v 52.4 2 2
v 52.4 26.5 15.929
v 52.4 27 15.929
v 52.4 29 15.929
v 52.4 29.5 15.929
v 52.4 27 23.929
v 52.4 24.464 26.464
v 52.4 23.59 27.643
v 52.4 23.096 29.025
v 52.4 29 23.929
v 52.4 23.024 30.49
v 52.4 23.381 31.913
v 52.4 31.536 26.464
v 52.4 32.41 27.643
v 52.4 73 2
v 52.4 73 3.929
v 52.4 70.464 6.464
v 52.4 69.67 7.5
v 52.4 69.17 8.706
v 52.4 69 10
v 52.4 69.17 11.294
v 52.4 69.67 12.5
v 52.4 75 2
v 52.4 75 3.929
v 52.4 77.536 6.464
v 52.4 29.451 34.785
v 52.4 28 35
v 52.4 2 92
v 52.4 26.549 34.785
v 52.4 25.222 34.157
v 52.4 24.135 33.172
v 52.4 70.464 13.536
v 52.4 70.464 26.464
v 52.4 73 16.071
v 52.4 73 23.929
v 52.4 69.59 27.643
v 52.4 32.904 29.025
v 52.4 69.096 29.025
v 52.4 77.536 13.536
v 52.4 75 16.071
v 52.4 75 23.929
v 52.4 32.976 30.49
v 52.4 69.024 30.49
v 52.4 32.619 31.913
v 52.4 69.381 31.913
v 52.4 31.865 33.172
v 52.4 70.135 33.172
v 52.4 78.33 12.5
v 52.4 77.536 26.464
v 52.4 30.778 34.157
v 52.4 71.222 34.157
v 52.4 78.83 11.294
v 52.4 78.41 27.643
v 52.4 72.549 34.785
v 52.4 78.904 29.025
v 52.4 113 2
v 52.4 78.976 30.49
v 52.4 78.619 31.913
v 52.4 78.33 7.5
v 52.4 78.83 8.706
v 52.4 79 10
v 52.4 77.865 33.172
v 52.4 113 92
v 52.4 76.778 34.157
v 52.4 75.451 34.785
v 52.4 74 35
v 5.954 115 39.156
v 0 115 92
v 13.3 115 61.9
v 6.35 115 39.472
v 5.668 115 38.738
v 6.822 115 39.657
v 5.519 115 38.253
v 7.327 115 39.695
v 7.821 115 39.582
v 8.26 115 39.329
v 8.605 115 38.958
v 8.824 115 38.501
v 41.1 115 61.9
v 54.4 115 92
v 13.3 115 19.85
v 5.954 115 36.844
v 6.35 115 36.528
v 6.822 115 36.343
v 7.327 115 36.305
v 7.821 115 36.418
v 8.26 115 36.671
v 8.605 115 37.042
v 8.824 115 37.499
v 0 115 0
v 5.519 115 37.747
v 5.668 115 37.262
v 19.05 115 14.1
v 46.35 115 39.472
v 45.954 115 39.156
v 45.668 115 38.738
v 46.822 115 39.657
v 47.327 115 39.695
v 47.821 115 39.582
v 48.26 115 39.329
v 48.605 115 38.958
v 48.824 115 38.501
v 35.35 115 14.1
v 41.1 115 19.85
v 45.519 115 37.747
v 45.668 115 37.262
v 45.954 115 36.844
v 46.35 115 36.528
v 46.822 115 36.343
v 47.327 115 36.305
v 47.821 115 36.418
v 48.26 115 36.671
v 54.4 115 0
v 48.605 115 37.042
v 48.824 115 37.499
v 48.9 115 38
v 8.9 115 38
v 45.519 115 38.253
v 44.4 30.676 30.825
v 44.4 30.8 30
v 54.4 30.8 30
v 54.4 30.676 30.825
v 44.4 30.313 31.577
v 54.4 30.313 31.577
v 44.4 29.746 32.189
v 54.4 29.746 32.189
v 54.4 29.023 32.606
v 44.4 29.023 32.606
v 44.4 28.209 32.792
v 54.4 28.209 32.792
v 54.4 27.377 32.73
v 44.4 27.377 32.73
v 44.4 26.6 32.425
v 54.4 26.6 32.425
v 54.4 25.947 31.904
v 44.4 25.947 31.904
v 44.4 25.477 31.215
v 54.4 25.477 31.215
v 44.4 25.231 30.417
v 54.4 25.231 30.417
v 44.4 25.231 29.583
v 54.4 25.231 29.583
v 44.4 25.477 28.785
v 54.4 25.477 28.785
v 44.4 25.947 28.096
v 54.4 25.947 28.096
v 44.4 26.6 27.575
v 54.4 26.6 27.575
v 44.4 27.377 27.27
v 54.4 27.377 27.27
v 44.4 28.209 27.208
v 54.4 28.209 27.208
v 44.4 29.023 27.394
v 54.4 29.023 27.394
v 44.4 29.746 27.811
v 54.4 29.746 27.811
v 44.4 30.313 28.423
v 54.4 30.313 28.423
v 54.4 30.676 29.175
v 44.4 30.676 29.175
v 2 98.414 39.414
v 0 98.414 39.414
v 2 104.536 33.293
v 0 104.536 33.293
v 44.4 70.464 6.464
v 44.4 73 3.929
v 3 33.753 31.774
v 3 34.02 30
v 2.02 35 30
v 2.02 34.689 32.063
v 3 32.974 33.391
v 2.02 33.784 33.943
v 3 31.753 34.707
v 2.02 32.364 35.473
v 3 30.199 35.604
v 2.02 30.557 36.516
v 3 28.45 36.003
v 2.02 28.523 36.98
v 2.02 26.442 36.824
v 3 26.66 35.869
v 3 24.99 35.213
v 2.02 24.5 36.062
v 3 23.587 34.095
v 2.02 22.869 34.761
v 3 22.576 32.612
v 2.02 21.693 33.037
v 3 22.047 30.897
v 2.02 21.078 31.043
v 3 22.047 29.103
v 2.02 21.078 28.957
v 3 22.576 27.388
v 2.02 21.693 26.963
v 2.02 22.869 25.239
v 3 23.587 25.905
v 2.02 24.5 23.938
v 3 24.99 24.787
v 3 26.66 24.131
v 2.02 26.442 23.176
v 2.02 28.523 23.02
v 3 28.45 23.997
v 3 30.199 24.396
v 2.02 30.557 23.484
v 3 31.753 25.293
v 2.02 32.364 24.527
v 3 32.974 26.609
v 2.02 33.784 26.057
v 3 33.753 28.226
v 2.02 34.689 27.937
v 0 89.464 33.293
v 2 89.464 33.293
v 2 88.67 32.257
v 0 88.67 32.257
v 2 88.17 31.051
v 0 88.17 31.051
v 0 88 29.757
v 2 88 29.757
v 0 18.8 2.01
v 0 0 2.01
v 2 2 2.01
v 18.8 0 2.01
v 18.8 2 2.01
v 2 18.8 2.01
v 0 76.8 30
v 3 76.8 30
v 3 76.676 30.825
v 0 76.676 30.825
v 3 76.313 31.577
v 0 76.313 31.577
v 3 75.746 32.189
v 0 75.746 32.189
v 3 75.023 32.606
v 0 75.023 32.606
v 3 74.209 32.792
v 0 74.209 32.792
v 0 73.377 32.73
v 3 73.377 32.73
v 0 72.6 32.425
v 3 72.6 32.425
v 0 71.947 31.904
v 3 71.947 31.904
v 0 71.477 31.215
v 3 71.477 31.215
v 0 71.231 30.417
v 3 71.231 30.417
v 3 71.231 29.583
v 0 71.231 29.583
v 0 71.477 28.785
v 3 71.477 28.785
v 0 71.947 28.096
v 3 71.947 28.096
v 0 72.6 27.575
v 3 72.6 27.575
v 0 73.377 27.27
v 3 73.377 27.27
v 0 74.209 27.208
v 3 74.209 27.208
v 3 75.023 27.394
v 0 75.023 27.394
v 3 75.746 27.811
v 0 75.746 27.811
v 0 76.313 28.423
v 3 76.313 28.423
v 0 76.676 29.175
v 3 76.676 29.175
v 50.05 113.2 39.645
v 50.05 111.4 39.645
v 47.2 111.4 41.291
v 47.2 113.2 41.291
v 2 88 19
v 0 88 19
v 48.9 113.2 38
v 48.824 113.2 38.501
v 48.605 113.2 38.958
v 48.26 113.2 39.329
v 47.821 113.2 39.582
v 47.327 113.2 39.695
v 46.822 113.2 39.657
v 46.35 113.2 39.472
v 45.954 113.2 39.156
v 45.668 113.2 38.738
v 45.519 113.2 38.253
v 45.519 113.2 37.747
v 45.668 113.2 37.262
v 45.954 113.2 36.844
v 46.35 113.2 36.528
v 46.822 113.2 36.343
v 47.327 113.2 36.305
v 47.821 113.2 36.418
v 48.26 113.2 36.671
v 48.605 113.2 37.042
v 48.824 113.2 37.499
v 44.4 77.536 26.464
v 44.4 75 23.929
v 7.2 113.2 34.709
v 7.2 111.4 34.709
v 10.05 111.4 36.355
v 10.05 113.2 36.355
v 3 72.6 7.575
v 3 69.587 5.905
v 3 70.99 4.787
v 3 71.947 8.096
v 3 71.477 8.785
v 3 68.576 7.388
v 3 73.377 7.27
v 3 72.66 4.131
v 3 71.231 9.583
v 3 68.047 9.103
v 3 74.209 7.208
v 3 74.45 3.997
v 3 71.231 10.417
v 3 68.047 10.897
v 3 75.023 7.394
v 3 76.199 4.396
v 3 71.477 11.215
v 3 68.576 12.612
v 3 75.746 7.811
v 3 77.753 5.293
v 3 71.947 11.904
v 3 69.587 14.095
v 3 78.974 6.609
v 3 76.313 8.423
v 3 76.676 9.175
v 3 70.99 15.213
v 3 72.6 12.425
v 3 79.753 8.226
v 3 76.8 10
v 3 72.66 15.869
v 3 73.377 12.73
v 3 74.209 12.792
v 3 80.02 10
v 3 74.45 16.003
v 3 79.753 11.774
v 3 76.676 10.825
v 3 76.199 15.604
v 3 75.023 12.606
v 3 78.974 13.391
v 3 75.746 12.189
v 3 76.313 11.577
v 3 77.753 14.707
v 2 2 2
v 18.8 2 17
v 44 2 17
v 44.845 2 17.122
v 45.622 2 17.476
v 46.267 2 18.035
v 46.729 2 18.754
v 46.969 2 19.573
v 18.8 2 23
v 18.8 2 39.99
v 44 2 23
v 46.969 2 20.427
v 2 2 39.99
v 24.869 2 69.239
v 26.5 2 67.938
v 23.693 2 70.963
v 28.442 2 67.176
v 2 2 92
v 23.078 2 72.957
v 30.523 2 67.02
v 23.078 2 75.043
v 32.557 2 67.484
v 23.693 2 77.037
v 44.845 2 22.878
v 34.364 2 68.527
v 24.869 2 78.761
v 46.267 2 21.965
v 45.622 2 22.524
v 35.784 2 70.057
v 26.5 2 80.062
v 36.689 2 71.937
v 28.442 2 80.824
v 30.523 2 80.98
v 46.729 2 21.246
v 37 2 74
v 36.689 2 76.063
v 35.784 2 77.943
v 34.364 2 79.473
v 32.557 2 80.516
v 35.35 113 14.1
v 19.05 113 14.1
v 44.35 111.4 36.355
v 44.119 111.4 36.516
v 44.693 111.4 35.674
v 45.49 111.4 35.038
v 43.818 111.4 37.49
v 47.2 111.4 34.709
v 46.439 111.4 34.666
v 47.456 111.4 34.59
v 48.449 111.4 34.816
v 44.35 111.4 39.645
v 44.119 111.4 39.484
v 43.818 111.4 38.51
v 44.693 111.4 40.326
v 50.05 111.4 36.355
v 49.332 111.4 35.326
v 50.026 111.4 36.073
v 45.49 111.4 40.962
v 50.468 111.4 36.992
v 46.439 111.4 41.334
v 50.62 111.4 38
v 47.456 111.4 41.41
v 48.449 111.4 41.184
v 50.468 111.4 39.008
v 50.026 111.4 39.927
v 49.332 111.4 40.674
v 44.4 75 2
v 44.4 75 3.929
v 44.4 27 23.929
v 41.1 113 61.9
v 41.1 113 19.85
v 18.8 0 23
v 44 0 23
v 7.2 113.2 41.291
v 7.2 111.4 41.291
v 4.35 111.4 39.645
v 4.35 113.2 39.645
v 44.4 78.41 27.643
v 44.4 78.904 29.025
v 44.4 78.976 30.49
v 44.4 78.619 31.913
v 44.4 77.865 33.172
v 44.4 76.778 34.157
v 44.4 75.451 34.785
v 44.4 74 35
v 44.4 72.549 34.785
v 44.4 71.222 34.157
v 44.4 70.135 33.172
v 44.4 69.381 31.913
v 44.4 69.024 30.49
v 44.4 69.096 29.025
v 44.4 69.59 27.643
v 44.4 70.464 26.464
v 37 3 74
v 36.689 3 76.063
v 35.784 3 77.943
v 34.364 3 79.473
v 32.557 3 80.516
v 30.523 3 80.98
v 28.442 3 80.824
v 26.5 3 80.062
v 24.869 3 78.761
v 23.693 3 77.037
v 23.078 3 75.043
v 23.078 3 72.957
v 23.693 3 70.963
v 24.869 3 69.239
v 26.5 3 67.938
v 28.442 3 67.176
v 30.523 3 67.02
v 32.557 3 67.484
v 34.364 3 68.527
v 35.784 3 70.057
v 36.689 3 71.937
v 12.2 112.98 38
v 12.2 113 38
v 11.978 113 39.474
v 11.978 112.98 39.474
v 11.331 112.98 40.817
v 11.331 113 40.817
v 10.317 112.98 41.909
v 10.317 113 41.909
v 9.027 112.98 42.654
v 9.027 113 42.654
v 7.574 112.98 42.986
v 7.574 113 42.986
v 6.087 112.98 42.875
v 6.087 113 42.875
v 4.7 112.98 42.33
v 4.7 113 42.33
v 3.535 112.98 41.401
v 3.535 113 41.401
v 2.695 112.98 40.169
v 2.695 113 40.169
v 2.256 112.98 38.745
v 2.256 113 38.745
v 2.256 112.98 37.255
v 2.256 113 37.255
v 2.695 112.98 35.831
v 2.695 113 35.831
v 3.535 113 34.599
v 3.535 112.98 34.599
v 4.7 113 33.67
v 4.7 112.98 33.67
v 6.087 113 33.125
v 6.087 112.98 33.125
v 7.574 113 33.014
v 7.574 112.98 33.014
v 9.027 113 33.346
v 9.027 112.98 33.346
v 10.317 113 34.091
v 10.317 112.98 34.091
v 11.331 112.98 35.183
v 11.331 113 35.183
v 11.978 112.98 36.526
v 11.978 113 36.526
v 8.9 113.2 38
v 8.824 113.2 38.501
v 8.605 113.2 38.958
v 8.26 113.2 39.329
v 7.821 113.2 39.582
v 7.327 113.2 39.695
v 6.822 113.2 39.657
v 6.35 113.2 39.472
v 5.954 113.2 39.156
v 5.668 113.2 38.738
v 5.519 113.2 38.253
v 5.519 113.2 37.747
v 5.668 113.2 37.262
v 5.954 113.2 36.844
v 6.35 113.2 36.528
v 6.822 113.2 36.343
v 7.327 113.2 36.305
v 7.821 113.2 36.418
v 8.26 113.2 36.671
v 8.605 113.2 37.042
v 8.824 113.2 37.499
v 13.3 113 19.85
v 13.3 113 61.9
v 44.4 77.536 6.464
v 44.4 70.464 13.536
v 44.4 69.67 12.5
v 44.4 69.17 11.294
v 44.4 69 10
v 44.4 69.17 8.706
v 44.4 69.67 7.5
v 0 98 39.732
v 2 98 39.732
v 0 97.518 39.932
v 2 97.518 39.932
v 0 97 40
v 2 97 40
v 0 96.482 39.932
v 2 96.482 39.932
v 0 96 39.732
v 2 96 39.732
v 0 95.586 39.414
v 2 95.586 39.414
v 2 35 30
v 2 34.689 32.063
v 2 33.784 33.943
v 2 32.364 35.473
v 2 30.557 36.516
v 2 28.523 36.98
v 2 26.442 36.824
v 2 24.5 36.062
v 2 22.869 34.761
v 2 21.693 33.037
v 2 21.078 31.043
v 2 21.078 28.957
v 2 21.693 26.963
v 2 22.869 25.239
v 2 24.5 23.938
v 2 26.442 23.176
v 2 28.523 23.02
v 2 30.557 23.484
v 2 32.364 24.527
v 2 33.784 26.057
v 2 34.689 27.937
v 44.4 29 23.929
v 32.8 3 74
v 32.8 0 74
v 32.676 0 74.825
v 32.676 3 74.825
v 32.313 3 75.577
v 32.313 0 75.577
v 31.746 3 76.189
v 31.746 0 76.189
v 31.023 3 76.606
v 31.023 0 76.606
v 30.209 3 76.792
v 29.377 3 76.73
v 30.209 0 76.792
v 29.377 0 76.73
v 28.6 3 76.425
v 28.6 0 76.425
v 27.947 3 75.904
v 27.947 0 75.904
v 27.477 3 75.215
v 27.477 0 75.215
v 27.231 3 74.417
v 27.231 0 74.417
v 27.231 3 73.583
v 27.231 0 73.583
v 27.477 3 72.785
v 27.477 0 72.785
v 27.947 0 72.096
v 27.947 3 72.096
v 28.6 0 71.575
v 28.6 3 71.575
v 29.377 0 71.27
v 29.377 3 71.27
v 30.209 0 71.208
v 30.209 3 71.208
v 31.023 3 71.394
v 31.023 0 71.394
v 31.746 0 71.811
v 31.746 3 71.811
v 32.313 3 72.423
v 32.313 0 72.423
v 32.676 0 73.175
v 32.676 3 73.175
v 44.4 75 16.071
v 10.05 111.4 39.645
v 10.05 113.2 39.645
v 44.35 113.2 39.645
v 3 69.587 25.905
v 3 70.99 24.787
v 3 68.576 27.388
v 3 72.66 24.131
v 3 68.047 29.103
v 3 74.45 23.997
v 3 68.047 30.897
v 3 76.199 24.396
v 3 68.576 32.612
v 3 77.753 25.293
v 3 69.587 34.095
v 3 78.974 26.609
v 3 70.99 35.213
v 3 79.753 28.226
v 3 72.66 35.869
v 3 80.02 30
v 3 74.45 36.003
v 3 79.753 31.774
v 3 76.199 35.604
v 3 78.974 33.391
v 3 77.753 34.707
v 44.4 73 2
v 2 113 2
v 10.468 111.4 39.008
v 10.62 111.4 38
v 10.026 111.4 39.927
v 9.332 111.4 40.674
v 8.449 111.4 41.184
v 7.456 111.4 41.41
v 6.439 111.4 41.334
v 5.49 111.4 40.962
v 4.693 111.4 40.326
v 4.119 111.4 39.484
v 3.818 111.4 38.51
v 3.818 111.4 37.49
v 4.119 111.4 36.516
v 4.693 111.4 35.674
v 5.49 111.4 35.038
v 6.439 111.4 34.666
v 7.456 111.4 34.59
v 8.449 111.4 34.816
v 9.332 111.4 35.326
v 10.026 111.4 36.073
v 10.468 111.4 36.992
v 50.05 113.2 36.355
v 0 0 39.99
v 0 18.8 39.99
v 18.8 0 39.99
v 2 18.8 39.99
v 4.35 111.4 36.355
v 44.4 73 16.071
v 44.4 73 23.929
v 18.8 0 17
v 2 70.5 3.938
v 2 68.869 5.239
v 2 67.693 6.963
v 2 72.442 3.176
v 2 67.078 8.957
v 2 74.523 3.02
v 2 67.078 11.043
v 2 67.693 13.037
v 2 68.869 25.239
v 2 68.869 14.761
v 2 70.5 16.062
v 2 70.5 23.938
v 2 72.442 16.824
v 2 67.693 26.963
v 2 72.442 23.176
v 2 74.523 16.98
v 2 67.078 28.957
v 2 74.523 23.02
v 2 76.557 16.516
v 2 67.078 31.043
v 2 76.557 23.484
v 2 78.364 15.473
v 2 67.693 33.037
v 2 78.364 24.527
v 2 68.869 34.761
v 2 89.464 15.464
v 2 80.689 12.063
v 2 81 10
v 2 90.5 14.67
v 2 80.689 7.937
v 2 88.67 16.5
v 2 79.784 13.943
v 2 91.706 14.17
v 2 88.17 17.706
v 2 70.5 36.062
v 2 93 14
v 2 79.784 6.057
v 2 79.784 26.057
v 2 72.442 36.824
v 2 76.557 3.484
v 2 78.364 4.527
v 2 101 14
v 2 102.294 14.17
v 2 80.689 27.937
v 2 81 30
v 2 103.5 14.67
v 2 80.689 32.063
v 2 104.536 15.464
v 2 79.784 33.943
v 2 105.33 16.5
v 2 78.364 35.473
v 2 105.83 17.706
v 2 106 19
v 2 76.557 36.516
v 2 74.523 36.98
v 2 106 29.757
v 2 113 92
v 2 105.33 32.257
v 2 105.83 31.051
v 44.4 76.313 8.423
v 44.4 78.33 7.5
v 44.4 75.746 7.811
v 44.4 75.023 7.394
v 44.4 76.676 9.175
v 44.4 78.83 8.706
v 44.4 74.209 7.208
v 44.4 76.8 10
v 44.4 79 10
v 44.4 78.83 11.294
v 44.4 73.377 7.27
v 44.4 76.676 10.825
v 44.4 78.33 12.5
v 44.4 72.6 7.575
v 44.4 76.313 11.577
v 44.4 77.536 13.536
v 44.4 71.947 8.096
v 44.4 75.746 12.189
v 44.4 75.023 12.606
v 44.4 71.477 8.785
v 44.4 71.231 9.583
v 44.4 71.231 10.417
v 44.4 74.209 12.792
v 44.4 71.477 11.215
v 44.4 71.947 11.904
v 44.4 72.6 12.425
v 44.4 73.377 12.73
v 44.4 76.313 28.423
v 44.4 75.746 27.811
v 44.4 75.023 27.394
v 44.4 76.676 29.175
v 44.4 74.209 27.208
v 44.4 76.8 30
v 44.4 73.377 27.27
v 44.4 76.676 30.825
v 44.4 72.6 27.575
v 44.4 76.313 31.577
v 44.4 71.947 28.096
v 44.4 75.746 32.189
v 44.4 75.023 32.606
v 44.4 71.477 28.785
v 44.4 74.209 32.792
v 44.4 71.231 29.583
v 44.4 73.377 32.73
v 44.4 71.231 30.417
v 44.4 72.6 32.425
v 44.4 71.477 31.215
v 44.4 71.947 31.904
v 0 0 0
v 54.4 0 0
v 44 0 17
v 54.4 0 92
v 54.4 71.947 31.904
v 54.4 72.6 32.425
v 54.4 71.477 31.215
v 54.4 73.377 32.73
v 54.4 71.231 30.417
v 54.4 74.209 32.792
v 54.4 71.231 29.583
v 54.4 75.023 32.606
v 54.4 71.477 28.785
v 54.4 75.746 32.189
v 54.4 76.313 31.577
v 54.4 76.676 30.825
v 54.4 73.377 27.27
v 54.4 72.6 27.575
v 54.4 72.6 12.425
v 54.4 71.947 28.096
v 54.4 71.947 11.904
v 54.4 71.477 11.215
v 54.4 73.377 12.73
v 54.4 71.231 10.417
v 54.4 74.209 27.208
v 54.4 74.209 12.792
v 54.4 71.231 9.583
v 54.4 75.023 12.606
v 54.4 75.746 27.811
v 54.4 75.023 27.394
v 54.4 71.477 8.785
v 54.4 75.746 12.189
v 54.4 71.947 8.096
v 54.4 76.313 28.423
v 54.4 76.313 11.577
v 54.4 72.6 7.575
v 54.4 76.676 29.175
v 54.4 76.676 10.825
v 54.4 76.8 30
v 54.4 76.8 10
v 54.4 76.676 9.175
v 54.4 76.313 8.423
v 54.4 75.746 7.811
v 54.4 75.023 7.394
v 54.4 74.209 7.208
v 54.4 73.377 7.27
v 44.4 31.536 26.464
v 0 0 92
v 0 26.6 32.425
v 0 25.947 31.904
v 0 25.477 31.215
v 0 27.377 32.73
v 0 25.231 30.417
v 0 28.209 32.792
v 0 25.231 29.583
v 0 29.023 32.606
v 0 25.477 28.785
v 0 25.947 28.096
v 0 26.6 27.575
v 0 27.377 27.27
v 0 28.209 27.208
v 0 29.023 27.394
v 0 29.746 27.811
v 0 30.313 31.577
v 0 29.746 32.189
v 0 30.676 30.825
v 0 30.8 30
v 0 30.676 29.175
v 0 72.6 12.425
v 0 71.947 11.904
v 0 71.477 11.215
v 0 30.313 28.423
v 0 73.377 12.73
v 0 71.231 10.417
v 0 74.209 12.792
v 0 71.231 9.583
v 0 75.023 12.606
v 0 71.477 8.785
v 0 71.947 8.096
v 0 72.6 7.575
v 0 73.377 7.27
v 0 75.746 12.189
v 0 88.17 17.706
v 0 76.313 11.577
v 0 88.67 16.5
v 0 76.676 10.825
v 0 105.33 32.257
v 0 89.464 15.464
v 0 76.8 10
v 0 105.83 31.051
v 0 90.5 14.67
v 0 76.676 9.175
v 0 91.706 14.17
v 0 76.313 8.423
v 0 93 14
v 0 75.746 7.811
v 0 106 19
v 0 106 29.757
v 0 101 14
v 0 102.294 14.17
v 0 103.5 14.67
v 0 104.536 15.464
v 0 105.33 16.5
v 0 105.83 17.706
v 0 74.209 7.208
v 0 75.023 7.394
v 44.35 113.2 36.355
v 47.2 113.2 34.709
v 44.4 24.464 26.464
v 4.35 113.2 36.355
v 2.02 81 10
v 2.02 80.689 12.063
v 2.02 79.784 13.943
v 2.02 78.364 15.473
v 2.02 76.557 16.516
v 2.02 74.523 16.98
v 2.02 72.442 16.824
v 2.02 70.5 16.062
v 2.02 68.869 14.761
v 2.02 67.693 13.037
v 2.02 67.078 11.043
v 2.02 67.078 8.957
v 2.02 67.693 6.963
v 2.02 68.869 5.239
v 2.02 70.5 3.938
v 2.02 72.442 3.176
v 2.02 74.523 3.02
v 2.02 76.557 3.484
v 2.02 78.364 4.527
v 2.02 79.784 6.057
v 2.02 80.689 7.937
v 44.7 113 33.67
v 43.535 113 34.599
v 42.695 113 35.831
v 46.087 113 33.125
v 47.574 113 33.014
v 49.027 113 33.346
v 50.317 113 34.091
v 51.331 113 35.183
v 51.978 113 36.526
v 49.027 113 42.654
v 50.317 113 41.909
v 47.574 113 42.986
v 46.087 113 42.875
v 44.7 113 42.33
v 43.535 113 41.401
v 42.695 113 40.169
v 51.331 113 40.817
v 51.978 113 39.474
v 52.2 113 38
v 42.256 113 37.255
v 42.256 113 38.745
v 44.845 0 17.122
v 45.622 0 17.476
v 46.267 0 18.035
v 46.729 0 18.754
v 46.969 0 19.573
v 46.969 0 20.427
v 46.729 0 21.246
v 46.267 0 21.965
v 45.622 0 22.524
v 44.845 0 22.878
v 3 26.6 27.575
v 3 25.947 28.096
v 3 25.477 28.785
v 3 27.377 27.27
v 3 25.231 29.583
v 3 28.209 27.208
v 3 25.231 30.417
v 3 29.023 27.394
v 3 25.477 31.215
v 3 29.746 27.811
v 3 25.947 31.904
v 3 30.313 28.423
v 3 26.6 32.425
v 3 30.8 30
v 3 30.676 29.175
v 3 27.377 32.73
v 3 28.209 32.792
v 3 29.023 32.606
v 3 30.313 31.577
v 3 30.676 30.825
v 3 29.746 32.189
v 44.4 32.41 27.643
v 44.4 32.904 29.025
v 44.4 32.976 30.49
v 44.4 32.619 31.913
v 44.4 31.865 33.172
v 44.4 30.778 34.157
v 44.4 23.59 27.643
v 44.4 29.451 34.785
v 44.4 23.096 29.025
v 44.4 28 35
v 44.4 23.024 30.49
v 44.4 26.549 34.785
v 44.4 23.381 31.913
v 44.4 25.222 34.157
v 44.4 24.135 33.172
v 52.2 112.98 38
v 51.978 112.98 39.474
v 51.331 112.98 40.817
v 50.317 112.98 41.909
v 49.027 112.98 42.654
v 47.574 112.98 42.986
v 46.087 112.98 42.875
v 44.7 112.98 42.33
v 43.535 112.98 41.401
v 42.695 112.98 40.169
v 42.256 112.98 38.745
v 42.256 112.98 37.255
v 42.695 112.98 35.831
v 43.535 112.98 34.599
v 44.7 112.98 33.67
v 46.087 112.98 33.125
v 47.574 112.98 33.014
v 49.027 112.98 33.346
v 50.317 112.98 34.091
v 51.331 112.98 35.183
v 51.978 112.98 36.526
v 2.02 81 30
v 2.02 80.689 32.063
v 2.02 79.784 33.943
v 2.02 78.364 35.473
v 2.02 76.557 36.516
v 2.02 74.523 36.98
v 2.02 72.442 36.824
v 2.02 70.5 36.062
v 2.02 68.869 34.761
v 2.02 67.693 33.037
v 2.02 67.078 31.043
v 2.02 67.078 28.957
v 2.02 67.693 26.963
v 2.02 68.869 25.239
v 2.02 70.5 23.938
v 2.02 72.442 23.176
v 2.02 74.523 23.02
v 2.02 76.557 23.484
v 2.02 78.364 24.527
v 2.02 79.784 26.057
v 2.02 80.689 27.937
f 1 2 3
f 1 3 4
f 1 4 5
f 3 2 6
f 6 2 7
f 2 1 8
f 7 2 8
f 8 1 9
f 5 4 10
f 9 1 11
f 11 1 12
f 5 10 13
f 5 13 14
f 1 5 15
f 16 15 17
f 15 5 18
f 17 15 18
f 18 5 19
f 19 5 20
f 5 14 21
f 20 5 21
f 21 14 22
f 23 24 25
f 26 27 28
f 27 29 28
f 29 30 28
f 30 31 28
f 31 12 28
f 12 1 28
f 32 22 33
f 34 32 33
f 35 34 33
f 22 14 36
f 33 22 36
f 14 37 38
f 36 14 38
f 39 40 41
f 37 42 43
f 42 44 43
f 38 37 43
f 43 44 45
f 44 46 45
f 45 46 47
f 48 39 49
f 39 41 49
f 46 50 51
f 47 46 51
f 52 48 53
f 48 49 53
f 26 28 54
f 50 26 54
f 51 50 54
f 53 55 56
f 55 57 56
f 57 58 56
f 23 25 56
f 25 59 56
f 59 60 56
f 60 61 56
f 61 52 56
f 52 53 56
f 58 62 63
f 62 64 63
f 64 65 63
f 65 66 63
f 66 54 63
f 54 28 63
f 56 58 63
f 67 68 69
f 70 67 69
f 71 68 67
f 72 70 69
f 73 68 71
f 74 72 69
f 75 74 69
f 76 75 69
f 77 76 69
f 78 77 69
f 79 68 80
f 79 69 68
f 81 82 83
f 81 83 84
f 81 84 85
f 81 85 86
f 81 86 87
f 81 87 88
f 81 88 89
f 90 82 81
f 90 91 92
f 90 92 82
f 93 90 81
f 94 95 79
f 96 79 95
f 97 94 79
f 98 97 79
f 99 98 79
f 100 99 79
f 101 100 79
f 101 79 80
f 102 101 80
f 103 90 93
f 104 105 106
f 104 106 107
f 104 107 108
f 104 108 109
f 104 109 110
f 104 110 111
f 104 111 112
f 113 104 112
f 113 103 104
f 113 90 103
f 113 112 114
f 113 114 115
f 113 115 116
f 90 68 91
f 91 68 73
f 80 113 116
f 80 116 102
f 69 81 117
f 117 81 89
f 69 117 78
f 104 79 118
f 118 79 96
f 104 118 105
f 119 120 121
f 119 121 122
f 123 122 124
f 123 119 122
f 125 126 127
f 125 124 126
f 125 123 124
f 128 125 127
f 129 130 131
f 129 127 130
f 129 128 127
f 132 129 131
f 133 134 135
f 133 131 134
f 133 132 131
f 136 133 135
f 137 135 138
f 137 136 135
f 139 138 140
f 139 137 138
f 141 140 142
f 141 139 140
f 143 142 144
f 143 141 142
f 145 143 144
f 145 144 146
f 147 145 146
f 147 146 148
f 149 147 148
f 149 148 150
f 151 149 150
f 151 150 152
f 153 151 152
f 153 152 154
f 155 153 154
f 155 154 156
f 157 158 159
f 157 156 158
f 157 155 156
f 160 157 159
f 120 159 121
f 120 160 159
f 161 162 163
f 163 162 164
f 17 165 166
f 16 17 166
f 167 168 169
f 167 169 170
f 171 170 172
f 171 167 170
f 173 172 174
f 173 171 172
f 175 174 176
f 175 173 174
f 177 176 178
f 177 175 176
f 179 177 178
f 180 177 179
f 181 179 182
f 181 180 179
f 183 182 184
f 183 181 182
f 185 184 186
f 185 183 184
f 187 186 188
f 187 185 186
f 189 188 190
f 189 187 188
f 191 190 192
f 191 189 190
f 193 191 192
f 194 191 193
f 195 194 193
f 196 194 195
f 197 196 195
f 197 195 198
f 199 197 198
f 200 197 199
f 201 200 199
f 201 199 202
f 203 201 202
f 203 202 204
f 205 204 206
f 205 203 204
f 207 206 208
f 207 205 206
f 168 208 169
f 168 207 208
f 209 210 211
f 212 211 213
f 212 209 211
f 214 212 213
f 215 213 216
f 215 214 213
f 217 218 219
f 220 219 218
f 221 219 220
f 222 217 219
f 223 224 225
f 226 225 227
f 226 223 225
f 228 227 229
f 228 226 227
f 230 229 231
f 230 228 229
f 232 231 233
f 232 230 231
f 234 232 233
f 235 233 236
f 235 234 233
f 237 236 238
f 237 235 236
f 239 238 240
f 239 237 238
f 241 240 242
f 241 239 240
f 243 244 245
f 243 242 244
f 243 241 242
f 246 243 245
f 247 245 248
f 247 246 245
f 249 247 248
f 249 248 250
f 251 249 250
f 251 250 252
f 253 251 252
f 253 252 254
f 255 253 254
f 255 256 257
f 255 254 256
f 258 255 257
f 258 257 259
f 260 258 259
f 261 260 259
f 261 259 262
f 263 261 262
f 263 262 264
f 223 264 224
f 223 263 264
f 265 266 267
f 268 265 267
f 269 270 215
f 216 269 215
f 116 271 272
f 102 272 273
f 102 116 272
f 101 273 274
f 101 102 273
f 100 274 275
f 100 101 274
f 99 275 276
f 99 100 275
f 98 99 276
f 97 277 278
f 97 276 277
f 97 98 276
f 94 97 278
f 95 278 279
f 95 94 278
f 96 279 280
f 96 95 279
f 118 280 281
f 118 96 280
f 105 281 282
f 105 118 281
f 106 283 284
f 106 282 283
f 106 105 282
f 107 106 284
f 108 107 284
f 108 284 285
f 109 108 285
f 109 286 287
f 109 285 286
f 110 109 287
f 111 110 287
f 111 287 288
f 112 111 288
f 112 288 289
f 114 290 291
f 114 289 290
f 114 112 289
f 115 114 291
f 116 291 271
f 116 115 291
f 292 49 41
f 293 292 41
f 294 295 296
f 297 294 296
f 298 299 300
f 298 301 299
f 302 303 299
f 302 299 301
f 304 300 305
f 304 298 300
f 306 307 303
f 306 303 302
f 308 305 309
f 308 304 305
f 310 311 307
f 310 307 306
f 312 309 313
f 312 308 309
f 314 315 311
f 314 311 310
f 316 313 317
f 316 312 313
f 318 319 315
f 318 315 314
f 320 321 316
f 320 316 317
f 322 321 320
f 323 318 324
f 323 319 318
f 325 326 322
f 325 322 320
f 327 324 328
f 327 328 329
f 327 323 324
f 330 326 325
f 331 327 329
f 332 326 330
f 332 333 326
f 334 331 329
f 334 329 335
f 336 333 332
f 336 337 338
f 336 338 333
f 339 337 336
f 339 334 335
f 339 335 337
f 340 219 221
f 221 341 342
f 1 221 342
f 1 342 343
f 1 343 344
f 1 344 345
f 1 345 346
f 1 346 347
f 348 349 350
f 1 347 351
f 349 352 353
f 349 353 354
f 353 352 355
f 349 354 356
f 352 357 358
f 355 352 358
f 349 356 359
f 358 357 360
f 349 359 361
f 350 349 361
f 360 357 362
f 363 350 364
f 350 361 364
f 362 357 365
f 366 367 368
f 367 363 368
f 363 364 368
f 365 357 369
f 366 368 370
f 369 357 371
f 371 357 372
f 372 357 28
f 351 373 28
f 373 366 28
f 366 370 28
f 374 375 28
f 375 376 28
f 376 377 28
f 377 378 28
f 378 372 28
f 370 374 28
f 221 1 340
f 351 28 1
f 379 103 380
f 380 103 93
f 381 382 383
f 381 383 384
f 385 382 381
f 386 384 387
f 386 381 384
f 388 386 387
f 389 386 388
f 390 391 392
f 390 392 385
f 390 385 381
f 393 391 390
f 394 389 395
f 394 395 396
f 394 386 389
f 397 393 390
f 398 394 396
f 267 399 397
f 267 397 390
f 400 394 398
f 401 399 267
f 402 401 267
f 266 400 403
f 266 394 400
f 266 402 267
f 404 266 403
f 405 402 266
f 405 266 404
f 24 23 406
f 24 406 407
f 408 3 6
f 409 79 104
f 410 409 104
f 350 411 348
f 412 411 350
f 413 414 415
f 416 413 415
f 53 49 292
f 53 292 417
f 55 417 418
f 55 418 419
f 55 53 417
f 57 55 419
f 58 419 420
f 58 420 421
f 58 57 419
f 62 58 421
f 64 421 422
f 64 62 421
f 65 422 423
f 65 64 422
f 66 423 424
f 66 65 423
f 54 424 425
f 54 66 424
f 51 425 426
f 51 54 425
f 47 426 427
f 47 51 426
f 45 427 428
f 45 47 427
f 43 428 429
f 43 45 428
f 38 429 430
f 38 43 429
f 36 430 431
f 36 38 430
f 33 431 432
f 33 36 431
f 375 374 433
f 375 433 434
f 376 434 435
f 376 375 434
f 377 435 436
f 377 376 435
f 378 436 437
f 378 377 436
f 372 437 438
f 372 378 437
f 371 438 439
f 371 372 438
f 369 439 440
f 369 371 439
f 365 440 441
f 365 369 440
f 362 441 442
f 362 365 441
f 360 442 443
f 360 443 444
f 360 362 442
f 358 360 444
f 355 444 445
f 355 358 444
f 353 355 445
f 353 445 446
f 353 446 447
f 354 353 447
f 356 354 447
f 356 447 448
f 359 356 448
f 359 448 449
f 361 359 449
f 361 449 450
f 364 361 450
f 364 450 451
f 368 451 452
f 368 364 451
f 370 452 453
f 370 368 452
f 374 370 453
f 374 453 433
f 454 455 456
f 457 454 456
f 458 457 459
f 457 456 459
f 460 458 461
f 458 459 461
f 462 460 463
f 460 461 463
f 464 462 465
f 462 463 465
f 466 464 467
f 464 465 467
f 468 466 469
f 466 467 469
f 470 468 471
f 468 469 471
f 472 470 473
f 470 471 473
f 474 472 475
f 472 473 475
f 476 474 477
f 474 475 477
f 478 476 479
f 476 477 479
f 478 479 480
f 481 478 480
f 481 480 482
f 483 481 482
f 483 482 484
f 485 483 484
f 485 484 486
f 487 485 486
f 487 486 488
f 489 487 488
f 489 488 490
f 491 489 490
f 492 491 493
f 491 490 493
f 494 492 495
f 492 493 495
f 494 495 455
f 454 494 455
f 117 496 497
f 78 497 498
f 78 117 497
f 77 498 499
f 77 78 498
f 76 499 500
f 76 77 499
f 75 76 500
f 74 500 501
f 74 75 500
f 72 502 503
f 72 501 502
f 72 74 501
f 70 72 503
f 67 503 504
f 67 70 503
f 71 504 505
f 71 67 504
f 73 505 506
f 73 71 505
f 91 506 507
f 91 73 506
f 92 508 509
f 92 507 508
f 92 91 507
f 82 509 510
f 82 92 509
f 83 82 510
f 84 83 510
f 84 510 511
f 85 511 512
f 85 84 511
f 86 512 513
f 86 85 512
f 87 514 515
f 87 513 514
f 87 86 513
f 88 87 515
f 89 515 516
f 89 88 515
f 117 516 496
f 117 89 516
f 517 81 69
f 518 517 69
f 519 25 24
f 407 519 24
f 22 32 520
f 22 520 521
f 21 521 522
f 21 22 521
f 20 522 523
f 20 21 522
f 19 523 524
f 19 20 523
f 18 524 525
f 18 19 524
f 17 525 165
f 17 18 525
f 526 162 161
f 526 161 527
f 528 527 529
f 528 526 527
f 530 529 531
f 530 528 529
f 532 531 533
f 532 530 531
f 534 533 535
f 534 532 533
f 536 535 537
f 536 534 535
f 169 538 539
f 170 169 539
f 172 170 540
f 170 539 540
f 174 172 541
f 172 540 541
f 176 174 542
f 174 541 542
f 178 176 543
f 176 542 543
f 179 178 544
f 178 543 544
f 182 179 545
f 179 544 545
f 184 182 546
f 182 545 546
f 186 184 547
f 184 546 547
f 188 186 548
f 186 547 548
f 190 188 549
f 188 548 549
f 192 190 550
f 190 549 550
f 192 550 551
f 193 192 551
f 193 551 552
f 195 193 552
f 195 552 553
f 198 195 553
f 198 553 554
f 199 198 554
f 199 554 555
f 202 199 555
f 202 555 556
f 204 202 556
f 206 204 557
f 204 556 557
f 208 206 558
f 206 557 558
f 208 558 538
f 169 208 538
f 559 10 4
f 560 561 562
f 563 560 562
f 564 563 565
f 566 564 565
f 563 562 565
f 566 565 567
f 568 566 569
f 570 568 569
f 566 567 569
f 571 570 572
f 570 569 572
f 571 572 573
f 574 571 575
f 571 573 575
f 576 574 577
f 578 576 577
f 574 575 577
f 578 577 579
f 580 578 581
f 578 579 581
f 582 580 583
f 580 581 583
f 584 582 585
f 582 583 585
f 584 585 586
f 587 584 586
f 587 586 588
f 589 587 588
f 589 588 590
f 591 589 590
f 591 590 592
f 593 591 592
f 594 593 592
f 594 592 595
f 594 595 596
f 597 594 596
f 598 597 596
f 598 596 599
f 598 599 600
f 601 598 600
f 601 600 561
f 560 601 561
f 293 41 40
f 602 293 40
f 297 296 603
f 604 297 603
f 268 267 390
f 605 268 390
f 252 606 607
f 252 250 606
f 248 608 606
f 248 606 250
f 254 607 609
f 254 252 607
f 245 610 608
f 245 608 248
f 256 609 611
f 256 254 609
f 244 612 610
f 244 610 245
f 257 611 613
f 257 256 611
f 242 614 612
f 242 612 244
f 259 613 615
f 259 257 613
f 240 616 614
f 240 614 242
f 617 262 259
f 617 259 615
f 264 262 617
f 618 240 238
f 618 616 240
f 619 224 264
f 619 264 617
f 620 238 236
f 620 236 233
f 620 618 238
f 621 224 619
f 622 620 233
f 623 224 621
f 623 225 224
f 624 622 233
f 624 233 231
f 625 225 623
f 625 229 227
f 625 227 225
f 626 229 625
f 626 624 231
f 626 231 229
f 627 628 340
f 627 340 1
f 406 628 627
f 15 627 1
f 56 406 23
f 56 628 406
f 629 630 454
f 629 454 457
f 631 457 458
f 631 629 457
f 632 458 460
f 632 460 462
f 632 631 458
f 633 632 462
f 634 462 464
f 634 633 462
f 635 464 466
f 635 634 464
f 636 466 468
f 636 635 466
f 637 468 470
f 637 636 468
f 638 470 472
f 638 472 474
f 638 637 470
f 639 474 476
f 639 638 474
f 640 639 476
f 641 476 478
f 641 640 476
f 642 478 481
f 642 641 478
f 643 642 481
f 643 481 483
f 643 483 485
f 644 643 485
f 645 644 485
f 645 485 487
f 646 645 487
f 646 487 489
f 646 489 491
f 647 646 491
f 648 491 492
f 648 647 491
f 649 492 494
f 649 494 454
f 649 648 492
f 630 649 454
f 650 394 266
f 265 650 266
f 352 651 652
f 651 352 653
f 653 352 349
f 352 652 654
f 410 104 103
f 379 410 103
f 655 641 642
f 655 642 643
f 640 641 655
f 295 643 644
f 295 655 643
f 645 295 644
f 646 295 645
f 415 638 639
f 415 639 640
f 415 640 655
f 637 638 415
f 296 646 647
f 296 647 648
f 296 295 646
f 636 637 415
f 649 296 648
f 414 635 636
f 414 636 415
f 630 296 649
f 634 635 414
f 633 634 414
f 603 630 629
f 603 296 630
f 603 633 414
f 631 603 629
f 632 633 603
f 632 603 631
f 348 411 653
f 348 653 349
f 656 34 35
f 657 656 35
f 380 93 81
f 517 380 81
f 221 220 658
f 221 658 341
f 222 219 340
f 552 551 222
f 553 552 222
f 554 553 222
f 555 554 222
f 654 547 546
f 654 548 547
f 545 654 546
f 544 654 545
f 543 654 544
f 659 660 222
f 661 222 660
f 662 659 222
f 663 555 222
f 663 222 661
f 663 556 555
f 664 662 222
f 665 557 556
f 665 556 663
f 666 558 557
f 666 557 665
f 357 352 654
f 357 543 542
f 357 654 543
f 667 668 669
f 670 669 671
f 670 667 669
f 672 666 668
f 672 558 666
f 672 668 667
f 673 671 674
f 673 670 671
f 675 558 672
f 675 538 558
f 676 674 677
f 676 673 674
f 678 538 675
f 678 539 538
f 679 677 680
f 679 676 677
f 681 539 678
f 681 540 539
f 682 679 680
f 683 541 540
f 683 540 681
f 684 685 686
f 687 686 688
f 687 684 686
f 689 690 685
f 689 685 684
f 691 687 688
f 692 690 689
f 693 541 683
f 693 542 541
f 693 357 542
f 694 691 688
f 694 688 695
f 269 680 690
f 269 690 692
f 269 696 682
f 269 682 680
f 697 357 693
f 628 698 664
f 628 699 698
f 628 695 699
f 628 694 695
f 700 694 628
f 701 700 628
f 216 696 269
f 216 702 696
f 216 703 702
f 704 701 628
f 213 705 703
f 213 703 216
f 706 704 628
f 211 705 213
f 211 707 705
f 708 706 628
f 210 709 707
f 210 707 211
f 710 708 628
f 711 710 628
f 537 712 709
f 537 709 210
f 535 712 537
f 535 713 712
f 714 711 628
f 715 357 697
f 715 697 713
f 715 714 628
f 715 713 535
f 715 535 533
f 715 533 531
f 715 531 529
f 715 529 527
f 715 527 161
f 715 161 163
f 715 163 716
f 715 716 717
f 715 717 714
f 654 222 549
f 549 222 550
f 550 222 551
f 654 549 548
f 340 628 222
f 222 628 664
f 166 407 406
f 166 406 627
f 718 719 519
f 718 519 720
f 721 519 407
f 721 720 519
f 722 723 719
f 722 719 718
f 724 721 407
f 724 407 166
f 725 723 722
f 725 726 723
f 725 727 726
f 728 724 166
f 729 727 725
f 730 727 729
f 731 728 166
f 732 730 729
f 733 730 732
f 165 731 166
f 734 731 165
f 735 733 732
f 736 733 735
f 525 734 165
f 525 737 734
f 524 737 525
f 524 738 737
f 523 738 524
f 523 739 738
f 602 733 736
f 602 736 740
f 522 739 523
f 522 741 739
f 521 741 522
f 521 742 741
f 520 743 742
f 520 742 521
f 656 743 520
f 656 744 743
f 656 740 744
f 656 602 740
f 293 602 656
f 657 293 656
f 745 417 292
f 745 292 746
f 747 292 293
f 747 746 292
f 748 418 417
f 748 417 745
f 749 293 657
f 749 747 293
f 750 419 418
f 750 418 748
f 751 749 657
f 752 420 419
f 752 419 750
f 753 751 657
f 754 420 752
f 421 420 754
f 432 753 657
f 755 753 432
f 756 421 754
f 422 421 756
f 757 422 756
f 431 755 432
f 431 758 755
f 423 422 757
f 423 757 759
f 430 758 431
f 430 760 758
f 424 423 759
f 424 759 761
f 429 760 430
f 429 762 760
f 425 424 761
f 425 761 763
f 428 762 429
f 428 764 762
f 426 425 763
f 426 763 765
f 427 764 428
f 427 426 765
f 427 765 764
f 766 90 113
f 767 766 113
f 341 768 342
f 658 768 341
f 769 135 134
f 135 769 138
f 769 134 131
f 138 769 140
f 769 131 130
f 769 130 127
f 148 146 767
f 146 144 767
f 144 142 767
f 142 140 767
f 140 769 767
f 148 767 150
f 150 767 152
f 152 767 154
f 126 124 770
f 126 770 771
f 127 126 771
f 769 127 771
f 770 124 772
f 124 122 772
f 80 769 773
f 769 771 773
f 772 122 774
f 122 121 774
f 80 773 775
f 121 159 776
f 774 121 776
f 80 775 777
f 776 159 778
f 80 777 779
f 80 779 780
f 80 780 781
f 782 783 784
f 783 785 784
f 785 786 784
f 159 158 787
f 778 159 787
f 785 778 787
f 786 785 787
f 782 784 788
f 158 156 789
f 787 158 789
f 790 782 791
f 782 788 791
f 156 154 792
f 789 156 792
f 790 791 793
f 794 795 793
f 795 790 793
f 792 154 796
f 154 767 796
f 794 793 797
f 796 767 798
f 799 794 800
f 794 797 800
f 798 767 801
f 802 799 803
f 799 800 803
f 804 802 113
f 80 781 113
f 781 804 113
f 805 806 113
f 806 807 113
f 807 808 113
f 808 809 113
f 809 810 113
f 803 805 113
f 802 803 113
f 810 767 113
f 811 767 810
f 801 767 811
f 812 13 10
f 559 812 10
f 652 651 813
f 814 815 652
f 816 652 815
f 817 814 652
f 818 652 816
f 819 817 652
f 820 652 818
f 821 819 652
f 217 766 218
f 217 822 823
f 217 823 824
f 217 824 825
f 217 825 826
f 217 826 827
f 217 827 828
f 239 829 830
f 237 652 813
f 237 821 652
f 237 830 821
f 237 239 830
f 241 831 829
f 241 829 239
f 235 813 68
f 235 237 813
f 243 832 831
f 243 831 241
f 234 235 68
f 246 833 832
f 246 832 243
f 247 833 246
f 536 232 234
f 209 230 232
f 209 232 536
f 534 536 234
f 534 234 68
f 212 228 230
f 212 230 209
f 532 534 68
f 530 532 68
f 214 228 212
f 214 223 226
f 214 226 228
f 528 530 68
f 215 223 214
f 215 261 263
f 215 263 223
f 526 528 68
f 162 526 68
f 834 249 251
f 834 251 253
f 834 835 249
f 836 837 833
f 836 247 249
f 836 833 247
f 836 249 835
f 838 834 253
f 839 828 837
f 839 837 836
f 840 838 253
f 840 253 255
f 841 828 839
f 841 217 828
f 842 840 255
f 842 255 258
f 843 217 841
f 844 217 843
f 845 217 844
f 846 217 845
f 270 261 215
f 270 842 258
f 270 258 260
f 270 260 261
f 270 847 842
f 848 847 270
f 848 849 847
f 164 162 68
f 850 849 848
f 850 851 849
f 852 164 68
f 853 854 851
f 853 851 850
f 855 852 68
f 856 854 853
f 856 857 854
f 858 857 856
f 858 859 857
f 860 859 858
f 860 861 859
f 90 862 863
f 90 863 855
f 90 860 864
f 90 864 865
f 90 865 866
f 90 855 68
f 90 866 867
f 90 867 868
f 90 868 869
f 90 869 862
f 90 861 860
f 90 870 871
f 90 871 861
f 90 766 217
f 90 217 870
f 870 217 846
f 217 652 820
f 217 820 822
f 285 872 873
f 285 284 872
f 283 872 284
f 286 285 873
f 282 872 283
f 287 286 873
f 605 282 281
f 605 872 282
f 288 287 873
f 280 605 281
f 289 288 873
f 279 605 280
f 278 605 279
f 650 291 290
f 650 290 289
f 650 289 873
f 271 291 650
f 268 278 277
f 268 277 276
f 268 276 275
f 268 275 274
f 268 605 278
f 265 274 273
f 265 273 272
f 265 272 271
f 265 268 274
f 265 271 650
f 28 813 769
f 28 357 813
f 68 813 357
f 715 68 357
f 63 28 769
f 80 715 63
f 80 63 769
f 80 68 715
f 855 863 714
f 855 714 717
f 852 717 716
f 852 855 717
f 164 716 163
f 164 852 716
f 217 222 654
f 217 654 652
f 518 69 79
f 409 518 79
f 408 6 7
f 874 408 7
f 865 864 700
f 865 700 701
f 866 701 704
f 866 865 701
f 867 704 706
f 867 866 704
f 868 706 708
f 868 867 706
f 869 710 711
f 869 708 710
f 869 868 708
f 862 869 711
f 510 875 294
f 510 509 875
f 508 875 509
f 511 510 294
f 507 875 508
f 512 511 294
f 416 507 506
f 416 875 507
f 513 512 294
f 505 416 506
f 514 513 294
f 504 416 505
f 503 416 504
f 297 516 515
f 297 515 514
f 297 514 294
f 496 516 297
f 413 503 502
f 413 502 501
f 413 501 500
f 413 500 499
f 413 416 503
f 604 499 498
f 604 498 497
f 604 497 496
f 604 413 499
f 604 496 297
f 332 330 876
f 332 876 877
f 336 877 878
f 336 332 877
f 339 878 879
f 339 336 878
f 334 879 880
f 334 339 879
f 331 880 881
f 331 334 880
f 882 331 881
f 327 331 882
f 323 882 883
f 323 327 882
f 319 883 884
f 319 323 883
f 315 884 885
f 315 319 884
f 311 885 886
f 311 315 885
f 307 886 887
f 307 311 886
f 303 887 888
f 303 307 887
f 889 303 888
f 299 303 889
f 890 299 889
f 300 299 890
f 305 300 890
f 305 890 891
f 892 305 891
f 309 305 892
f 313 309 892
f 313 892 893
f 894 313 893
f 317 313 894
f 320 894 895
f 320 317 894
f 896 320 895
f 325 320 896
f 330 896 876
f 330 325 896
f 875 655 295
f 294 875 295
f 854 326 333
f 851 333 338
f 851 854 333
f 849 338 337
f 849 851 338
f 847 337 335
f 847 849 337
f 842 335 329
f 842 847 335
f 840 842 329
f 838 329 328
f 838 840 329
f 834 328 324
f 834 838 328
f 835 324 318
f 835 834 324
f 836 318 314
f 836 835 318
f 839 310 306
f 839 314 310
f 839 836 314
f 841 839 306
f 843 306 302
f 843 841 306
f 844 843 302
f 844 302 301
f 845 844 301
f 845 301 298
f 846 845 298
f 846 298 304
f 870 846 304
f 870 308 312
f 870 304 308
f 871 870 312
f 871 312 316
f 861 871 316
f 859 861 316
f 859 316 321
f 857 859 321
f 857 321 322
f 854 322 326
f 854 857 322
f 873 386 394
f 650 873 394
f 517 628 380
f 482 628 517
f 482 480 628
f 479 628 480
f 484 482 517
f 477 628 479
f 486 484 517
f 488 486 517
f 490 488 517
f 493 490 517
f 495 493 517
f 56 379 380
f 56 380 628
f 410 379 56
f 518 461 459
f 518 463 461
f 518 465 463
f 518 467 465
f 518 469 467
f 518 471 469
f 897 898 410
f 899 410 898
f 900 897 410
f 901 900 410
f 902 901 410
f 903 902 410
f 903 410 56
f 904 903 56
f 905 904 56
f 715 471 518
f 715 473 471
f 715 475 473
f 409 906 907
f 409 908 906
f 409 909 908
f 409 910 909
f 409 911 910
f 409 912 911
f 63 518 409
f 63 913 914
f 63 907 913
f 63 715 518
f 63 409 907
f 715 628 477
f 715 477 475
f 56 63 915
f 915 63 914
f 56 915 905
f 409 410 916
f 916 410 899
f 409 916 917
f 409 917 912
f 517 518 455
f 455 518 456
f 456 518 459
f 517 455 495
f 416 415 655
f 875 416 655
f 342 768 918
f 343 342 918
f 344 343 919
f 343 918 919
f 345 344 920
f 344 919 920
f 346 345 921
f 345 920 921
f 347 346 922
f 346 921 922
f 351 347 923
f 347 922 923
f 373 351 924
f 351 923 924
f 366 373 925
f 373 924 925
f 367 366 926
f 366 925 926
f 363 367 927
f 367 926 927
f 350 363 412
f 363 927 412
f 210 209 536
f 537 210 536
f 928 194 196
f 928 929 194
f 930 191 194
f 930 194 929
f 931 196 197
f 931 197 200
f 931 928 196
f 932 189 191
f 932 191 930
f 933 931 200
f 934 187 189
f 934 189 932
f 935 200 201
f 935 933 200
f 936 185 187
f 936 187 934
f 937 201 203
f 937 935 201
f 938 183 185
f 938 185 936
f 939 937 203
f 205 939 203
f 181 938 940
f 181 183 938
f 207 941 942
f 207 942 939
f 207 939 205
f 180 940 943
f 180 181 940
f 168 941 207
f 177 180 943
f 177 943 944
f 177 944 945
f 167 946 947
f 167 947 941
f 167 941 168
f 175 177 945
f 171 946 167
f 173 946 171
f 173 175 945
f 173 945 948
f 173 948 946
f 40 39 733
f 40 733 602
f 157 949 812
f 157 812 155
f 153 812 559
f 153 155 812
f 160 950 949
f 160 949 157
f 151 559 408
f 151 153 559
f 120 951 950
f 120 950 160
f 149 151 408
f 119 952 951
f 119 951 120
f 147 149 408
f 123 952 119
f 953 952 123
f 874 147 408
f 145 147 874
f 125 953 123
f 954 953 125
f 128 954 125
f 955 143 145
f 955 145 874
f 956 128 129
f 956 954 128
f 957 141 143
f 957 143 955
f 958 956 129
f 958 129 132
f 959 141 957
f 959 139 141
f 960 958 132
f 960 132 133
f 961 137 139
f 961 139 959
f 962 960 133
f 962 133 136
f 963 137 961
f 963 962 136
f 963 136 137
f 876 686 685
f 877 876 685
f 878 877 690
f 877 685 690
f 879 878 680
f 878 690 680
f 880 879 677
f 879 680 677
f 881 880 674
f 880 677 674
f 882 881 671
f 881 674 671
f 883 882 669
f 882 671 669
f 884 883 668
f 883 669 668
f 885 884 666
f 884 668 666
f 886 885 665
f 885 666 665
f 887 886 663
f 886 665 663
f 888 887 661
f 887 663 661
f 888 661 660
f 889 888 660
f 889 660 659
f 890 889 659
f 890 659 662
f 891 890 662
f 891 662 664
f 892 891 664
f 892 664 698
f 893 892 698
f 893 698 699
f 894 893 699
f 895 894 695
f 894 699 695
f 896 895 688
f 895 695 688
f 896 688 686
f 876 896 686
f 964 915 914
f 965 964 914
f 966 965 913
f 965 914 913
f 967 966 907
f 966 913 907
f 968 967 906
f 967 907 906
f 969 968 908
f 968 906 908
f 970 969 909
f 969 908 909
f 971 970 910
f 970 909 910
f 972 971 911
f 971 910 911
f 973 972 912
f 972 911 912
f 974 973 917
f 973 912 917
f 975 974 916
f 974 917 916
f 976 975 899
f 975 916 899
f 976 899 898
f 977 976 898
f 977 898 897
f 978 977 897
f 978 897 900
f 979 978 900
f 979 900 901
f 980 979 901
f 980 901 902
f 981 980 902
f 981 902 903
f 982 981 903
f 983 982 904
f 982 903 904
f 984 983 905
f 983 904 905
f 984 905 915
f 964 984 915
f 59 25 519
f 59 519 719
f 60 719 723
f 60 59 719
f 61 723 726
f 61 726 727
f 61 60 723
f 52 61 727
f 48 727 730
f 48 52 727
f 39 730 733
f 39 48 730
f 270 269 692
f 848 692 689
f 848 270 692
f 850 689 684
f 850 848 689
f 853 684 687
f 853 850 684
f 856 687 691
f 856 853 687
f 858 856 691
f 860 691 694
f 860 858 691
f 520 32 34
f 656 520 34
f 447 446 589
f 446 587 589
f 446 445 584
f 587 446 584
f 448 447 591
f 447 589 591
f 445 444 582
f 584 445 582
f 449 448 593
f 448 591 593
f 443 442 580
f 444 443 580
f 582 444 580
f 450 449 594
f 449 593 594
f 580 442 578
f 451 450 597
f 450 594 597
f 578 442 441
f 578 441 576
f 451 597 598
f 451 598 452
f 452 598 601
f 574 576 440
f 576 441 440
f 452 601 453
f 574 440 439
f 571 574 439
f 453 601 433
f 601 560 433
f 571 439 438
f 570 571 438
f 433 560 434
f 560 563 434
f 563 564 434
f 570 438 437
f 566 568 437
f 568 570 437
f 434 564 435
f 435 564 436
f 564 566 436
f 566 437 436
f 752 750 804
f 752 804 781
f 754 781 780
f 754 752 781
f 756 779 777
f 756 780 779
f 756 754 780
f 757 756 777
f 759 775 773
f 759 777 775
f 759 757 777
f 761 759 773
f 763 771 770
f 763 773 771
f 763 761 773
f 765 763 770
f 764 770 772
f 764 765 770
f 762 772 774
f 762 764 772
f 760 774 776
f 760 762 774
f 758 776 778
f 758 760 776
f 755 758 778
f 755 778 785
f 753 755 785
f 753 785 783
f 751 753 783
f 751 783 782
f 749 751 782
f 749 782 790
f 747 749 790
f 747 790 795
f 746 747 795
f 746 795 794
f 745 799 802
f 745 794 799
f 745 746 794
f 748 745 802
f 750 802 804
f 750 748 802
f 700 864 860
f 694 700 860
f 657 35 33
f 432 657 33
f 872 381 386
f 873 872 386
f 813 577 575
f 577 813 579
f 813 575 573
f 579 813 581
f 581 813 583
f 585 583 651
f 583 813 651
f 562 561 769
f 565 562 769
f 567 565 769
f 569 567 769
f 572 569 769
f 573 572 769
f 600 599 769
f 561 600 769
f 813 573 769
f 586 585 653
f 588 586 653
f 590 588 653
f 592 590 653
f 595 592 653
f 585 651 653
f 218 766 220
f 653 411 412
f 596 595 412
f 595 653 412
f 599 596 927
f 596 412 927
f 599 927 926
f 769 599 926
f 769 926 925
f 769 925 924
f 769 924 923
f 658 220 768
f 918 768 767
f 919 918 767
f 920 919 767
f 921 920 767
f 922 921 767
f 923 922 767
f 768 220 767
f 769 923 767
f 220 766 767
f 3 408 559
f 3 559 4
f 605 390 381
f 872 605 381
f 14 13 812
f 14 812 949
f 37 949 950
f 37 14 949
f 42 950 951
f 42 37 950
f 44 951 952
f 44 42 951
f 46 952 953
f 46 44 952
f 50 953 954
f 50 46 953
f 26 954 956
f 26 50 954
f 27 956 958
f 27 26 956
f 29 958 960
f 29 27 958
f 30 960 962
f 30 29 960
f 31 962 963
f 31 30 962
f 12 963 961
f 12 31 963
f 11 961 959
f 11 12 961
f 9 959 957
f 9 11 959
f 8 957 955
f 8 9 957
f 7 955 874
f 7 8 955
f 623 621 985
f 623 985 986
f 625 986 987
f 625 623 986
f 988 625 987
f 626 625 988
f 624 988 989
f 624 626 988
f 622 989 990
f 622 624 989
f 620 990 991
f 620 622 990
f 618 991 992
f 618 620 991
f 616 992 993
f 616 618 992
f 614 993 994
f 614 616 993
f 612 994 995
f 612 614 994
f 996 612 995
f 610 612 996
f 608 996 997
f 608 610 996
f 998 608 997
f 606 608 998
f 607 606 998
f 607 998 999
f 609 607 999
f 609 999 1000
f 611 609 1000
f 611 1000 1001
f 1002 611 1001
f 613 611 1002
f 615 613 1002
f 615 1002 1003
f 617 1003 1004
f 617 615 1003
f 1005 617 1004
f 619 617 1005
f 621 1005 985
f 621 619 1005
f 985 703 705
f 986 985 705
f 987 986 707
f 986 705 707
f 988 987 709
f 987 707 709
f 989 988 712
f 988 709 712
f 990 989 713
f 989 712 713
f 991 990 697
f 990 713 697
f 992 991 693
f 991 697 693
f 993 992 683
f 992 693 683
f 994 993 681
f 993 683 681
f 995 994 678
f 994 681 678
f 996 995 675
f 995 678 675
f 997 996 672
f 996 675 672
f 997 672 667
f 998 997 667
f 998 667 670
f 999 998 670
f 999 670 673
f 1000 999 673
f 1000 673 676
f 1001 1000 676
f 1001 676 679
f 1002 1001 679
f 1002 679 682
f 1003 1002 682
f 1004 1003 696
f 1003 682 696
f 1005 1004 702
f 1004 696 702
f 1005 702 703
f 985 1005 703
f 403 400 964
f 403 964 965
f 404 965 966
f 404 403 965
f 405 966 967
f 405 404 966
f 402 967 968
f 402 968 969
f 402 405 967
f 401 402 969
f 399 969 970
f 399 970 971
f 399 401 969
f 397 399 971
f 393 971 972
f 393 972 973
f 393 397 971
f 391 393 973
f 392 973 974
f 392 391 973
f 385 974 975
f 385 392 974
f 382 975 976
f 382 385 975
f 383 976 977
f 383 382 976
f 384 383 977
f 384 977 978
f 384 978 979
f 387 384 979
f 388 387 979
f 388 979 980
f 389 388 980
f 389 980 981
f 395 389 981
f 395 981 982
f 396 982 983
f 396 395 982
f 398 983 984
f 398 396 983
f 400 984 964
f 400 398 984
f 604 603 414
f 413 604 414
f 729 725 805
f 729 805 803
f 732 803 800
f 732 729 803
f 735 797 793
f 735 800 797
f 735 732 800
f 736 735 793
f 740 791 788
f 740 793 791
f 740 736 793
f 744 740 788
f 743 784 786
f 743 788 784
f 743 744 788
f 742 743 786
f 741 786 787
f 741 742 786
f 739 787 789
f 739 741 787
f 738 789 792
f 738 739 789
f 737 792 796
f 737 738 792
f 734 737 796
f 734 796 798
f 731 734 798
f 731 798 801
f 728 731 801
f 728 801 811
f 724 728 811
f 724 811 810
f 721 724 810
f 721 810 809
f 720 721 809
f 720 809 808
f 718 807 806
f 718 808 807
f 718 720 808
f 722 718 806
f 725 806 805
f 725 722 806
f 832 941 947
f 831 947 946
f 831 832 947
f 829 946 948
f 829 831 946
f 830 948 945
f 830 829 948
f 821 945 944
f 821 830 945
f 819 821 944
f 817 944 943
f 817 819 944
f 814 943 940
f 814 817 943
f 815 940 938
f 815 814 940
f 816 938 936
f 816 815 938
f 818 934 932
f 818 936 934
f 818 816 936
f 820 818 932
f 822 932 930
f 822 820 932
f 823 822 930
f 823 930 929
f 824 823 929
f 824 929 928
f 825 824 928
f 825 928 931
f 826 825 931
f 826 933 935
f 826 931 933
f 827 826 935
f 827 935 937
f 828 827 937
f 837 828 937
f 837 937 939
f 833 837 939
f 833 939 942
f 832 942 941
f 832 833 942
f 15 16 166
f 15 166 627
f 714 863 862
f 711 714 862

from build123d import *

# Parameters (mm, degrees)
SKETCH_W        = 54.4
SKETCH_H        = 115
PAD_DEPTH       = 92
SKETCH001_W     = 50.4
SKETCH001_H     = 111
POCKET_DEPTH    = 90
POCKET001_DEPTH = 3
SKETCH003_R     = 1.7
POCKET002_DEPTH = 3
POCKET003_DEPTH = 18.99
POCKET004_DEPTH = 2.02
SKETCH006_R     = 5
SKETCH006_R_2   = 1.7
PAD001_DEPTH    = 1.6
POCKET005_DEPTH = 1.8
SKETCH008_R     = 7
PAD002_DEPTH    = 1
PAD003_DEPTH    = 8
POCKET006_DEPTH = 1.5
SKETCH011_R     = 2.8
POCKET007_DEPTH = 54.401
SKETCH012_R     = 7
PAD004_DEPTH    = 1
SKETCH013_R     = 2.8
POCKET008_DEPTH = 4
CHAMFER_SIZE    = 0.98
CHAMFER001_SIZE = 1.58


with BuildPart() as part:
    # Sketch → Pad (new body)
    with BuildSketch(Plane.XY):
        with Locations((27.2, 57.5)):
            Rectangle(SKETCH_W, SKETCH_H)
    extrude(amount=PAD_DEPTH)

    # Sketch001 → Pocket (cut)
    with BuildSketch(Plane.XY.offset(92)):
        with Locations((27.2, 57.5)):
            Rectangle(SKETCH001_W, SKETCH001_H)
    extrude(amount=-POCKET_DEPTH, mode=Mode.SUBTRACT)

    # Sketch002 → Pocket001 (cut)
    with BuildSketch(Plane.XZ):
        with BuildLine():
            Line((3, 23), (44, 23))
            ThreePointArc((44, 17), (47, 20), (44, 23))
            Line((44, 17), (3, 17))
            Line((3, 17), (3, 23))
        make_face()
    extrude(amount=-POCKET001_DEPTH, mode=Mode.SUBTRACT)

    # Sketch003 → Pocket002 (cut)
    with BuildSketch(Plane.XZ.offset(-115)):
        with Locations((7.2, 38)):
            Circle(SKETCH003_R)
        with Locations((47.2, 38)):
            Circle(SKETCH003_R)
        Polygon((13.3, 61.9), (41.1, 61.9), (41.1, 19.85), (35.35, 14.1), (19.05, 14.1), (13.3, 19.85), align=None)
    extrude(amount=POCKET002_DEPTH, mode=Mode.SUBTRACT)

    # Sketch004 → Pocket003 (cut, symmetric)
    with BuildSketch(Plane.XY.offset(21)):
        Polygon((0, 0), (18.8, 0), (18.8, 2.4), (2.4, 18.8), (0, 18.8), align=None)
    extrude(amount=POCKET003_DEPTH, both=True, mode=Mode.SUBTRACT)

    # Sketch005 → Pocket004 (cut)
    with BuildSketch(Plane.YZ):
        with BuildLine():
            Line((106, 29.757359), (106, 19))
            ThreePointArc((101, 14), (104.535534, 15.464466), (106, 19))
            Line((101, 14), (93, 14))
            ThreePointArc((88, 19), (89.464466, 15.464466), (93, 14))
            Line((88, 19), (88, 29.757359))
            ThreePointArc((89.464466, 33.292893), (88.380602, 31.670776), (88, 29.757359))
            Line((89.464466, 33.292893), (95.585786, 39.414214))
            ThreePointArc((98.414214, 39.414214), (97, 40), (95.585786, 39.414214))
            Line((98.414214, 39.414214), (104.535534, 33.292893))
            ThreePointArc((106, 29.757359), (105.619398, 31.670777), (104.535534, 33.292893))
        make_face()
    extrude(amount=POCKET004_DEPTH, mode=Mode.SUBTRACT)

    # Sketch006 → Pad001 (join)
    with BuildSketch(Plane.XZ.offset(-113)):
        with Locations((7.2, 38)):
            Circle(SKETCH006_R)
        with Locations((7.2, 38)):
            Circle(SKETCH006_R_2, mode=Mode.SUBTRACT)
        with Locations((47.2, 38)):
            Circle(SKETCH006_R)
        with Locations((47.2, 38)):
            Circle(SKETCH006_R_2, mode=Mode.SUBTRACT)
    extrude(amount=PAD001_DEPTH)

    # Sketch007 → Pocket005 (cut)
    with BuildSketch(Plane.XZ.offset(-111.4)):
        Polygon((7.2, 41.290897), (4.35, 39.645448), (4.35, 36.354552), (7.2, 34.709103), (10.05, 36.354552), (10.05, 39.645448), align=None)
        Polygon((47.2, 41.290897), (44.35, 39.645448), (44.35, 36.354552), (47.2, 34.709103), (50.05, 36.354552), (50.05, 39.645448), align=None)
    extrude(amount=-POCKET005_DEPTH, mode=Mode.SUBTRACT)

    # Sketch008 → Pad002 (join)
    with BuildSketch(Plane.YZ.offset(2)):
        with Locations((28, 30)):
            Circle(SKETCH008_R)
        with Locations((74, 30)):
            Circle(SKETCH008_R)
        with Locations((74, 10)):
            Circle(SKETCH008_R)
    extrude(amount=PAD002_DEPTH)

    # Sketch009 → Pad003 (join)
    with BuildSketch(Plane.YZ.offset(52.4)):
        with BuildLine():
            Line((31.535537, 26.46447), (29, 23.928932))
            Line((29, 23.928932), (29, 15.928932))
            Line((29, 15.928932), (27, 15.928932))
            Line((27, 15.928932), (27, 23.928932))
            Line((27, 23.928932), (24.464463, 26.46447))
            ThreePointArc((31.535537, 26.46447), (28, 35), (24.464463, 26.46447))
        make_face()
        with BuildLine():
            Line((77.535537, 26.46447), (75, 23.928932))
            Line((75, 23.928932), (75, 16.071068))
            Line((77.535528, 13.53554), (75, 16.071068))
            ThreePointArc((77.535519, 6.464451), (79, 9.999994), (77.535528, 13.53554))
            Line((77.535519, 6.464451), (74.999974, 3.928932))
            Line((74.999974, 1), (74.999974, 3.928932))
            Line((72.999974, 1), (74.999974, 1))
            Line((72.999974, 3.928932), (72.999974, 1))
            Line((70.464455, 6.464477), (72.999974, 3.928932))
            ThreePointArc((70.464461, 13.535528), (69, 10.000004), (70.464455, 6.464477))
            Line((70.464461, 13.535528), (73, 16.071068))
            Line((73, 16.071068), (73, 23.928932))
            Line((73, 23.928932), (70.464463, 26.46447))
            ThreePointArc((77.535537, 26.46447), (74, 35), (70.464463, 26.46447))
        make_face()
    extrude(amount=-PAD003_DEPTH)

    # Sketch010 → Pocket006 (cut, symmetric)
    with BuildSketch(Plane.XZ.offset(-28)):
        Polygon((44.4, 23.928932), (52.4, 15.928932), (44.4, 15.928932), align=None)
    extrude(amount=POCKET006_DEPTH, both=True, mode=Mode.SUBTRACT)

    # Sketch011 → Pocket007 (cut, through all)
    with BuildSketch(Plane.YZ):
        with Locations((28, 30)):
            Circle(SKETCH011_R)
        with Locations((74, 30)):
            Circle(SKETCH011_R)
        with Locations((74, 10)):
            Circle(SKETCH011_R)
    extrude(amount=POCKET007_DEPTH, mode=Mode.SUBTRACT)

    # Sketch012 → Pad004 (join)
    with BuildSketch(Plane.XZ.offset(-2)):
        with Locations((30, 74)):
            Circle(SKETCH012_R)
    extrude(amount=-PAD004_DEPTH)

    # Sketch013 → Pocket008 (cut)
    with BuildSketch(Plane.XZ):
        with Locations((30, 74)):
            Circle(SKETCH013_R)
    extrude(amount=-POCKET008_DEPTH, mode=Mode.SUBTRACT)

    # Chamfer
    chamfer_edges = [part.edges().sort_by_distance(p)[0] for p in [
        (3, 21, 30),
        (3, 67, 30),
        (3, 67, 10),
    ]]
    chamfer(chamfer_edges, length=CHAMFER_SIZE)

    # Chamfer001
    chamfer001_edges = [part.edges().sort_by_distance(p)[0] for p in [
        (42.2, 111.4, 38),
        (2.2, 111.4, 38),
    ]]
    chamfer(chamfer001_edges, length=CHAMFER001_SIZE)


solid = part.part
